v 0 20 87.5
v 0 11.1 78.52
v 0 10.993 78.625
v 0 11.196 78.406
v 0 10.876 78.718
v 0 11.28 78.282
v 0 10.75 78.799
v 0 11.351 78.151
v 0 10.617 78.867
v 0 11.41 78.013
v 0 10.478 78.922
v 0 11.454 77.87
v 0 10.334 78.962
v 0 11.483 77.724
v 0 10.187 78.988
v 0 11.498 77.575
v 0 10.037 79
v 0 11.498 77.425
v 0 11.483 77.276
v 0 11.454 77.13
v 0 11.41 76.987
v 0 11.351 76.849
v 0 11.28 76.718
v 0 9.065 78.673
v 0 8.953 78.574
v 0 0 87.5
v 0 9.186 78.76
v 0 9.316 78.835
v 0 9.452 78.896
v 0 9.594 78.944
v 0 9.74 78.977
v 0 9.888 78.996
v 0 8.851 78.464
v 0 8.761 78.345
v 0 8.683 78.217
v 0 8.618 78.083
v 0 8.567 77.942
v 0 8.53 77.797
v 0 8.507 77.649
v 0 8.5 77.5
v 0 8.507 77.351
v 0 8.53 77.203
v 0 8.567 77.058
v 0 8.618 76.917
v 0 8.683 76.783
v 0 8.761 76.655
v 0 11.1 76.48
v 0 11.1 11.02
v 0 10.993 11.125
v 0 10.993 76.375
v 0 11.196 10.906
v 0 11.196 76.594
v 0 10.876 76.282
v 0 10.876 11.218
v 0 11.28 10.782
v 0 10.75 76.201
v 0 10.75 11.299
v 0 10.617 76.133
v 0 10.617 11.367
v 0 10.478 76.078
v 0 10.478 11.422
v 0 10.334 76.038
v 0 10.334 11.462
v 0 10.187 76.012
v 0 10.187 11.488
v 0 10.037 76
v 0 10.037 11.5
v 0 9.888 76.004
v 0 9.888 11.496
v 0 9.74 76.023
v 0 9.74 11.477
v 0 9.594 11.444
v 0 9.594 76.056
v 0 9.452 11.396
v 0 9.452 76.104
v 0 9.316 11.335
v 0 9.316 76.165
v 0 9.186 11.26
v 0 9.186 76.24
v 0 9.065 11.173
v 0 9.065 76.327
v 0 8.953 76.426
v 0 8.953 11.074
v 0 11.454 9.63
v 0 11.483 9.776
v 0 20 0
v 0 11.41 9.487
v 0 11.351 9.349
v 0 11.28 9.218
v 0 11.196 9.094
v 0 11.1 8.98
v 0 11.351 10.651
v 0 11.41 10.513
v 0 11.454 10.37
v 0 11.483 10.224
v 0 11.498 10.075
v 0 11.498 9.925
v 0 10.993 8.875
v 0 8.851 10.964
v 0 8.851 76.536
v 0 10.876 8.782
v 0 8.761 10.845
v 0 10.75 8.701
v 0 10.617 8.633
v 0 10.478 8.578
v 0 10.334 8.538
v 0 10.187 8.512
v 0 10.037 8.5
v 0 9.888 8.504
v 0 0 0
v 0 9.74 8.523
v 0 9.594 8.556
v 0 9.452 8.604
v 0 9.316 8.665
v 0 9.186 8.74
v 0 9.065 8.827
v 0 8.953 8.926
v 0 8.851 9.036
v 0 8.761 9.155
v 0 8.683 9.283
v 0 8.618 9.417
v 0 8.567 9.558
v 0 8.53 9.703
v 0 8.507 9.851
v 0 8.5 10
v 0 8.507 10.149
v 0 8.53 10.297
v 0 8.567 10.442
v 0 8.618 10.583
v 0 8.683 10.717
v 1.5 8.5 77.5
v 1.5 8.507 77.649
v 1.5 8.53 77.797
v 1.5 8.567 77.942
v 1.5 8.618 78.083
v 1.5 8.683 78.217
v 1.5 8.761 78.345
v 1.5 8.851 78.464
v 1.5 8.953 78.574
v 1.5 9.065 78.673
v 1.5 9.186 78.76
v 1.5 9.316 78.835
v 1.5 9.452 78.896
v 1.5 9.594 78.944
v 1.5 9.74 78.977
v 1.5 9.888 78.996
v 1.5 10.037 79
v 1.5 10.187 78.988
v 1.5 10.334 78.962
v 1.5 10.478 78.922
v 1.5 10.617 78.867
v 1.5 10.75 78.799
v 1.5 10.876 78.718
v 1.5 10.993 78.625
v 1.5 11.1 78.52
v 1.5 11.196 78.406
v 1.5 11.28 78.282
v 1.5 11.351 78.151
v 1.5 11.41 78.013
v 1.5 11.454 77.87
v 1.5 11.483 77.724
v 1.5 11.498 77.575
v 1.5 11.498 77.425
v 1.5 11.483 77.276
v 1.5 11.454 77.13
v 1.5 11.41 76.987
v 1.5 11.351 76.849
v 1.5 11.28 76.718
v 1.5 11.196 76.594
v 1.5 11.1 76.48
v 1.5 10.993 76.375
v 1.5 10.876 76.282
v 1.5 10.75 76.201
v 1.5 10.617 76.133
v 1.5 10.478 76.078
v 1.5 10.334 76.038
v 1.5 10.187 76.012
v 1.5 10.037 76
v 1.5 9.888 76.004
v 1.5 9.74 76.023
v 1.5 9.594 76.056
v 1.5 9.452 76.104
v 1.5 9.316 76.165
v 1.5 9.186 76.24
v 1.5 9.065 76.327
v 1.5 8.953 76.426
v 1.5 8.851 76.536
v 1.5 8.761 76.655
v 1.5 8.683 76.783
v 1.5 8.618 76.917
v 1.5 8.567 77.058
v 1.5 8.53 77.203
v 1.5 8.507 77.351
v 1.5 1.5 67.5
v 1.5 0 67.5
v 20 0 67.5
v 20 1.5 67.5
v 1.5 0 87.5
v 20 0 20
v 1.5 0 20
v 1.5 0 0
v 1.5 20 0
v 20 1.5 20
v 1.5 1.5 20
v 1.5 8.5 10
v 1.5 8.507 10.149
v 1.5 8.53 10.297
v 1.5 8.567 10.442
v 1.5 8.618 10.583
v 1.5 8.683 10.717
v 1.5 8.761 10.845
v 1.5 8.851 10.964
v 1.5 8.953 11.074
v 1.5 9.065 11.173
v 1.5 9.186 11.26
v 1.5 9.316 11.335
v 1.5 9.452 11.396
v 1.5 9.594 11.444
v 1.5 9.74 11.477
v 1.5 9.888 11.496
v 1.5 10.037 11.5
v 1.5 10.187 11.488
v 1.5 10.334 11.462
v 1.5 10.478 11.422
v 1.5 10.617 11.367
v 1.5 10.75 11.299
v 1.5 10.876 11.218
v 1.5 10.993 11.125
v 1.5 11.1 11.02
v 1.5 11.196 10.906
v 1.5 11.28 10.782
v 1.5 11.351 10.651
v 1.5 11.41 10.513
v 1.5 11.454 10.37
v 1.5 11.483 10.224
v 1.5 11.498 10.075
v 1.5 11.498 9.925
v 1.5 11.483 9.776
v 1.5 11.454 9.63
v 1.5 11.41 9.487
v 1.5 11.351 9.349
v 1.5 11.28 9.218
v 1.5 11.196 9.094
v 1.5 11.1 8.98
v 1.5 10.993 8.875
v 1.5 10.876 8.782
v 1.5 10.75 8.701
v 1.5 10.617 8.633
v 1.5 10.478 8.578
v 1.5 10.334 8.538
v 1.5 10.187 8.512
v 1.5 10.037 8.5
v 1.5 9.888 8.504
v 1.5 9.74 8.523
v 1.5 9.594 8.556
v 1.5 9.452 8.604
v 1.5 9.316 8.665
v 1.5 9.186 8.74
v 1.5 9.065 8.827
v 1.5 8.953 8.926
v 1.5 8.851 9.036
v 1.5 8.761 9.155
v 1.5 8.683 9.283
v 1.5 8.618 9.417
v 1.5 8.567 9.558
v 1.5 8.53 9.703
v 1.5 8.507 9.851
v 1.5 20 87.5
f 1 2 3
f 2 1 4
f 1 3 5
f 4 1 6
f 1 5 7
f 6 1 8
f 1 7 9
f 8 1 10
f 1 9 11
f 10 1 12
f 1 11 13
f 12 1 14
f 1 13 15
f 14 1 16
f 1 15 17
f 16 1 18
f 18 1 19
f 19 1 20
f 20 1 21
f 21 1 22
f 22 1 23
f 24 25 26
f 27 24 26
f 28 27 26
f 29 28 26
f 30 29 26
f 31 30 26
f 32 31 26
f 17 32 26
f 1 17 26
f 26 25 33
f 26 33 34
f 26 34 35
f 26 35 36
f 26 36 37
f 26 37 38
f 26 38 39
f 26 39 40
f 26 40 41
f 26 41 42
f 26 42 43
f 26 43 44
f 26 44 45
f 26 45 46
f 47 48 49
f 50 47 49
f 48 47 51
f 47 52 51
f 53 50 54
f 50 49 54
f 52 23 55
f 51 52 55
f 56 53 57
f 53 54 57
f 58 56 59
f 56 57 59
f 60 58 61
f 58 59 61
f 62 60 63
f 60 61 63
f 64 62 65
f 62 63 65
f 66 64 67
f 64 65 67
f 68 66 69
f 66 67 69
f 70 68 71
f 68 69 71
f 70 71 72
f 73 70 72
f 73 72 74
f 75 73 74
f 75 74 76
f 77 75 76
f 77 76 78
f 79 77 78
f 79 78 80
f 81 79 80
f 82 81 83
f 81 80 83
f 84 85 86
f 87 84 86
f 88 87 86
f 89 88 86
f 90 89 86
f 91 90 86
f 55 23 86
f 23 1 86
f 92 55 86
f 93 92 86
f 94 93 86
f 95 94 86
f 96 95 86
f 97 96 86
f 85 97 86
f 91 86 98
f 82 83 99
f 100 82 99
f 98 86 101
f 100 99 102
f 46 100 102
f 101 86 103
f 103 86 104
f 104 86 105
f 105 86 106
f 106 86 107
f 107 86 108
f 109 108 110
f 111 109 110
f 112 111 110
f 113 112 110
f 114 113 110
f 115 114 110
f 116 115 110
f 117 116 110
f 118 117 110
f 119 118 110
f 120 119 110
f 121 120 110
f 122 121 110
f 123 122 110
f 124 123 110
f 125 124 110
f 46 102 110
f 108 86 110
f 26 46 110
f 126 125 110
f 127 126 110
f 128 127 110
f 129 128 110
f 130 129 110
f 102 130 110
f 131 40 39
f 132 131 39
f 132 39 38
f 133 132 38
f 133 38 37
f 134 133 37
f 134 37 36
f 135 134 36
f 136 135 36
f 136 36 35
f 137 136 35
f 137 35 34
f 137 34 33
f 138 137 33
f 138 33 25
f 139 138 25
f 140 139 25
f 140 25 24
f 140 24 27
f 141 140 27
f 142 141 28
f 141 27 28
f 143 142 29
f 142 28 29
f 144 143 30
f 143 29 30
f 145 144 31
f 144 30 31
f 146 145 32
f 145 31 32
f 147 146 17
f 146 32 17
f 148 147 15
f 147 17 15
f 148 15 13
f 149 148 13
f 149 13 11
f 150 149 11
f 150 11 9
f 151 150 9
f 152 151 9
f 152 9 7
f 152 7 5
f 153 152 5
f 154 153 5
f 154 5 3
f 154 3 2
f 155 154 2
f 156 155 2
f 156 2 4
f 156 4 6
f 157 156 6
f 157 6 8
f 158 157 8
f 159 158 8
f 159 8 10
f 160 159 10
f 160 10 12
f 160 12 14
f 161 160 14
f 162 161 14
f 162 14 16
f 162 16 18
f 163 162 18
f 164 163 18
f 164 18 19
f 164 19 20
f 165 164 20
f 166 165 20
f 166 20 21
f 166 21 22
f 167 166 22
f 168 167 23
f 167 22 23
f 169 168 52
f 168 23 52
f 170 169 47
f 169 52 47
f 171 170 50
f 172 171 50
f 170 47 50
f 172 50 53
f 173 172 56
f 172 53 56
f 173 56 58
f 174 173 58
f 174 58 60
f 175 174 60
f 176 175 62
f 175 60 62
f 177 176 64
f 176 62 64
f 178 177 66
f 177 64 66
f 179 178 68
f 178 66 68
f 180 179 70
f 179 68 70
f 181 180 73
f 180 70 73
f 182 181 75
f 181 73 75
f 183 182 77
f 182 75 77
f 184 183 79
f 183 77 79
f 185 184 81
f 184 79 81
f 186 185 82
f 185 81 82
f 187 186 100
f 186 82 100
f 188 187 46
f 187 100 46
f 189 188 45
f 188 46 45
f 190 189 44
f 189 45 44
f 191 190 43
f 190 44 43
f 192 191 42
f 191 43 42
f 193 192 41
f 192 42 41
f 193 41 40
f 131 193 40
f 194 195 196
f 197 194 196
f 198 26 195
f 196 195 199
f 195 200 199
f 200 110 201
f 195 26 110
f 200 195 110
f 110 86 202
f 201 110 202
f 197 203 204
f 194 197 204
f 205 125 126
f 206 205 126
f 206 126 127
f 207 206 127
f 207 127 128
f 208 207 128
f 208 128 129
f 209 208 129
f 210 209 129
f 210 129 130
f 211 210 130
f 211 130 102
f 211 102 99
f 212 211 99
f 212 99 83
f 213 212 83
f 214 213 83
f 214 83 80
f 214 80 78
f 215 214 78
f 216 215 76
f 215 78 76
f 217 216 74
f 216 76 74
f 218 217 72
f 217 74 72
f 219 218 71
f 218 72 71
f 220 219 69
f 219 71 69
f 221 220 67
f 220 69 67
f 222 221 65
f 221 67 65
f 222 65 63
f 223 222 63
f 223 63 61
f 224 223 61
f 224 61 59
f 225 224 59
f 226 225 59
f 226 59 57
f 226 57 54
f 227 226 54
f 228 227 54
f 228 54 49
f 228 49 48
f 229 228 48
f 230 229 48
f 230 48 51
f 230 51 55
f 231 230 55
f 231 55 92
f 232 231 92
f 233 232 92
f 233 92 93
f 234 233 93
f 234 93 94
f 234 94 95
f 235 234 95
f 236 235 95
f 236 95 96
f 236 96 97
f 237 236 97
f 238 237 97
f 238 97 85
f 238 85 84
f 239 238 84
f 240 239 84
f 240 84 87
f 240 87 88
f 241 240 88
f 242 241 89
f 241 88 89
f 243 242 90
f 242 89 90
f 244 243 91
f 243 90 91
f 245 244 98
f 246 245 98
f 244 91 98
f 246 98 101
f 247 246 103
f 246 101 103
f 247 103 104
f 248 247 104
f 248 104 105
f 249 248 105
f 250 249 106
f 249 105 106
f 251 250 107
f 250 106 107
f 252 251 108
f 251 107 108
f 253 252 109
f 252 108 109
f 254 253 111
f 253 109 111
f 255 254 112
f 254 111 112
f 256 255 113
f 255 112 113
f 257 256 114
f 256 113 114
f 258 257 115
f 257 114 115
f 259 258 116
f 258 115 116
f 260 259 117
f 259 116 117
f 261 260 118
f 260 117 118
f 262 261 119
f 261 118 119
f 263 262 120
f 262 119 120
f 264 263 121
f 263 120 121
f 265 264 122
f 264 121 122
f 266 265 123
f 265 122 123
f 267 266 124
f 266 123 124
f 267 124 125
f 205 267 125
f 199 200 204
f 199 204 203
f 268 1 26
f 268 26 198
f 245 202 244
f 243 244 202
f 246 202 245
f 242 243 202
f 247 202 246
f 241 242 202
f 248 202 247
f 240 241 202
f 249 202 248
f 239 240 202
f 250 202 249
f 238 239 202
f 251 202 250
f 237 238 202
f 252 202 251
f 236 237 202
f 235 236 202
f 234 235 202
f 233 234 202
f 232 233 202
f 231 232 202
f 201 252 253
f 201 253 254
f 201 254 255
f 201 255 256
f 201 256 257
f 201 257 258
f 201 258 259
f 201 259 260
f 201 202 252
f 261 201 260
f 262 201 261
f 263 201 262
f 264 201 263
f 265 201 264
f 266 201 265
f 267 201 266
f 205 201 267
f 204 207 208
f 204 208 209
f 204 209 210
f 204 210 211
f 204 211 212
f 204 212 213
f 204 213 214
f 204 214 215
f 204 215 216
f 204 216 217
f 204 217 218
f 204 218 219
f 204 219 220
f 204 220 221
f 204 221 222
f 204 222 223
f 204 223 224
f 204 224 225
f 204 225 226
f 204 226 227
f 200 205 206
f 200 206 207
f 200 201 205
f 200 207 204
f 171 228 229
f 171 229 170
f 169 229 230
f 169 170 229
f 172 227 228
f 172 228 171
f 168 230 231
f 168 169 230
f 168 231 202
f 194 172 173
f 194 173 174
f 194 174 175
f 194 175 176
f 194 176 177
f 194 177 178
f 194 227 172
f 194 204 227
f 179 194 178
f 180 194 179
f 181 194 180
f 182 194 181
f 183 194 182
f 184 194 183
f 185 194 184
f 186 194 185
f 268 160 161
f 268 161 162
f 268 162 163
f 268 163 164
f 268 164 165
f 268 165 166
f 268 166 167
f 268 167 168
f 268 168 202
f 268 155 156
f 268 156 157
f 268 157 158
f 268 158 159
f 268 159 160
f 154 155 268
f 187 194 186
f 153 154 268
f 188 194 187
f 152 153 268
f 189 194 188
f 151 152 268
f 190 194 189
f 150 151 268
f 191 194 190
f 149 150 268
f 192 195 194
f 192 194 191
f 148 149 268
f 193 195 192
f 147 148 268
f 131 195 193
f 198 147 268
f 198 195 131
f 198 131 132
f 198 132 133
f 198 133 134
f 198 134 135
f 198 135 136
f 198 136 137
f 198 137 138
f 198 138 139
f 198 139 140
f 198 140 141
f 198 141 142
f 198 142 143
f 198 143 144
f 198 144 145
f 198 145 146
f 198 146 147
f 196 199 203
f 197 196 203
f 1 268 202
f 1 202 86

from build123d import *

# Parameters (mm, degrees)
EXTRUSION1_DEPTH = 87.5
ESQUISSE3_R      = 1.5
EXTRUSION3_DEPTH = 10
ESQUISSE4_W      = 18.5
ESQUISSE4_H      = 20
EXTRUSION4_DEPTH = 1.5


with BuildPart() as part:
    # Esquisse1 → Extrusion1 (new body)
    with BuildSketch(Plane.XY):
        Polygon((0, 0), (20, 0), (20, 1.5), (1.5, 1.5), (1.5, 20), (0, 20), align=None)
    extrude(amount=EXTRUSION1_DEPTH)

    # Esquisse3 → Extrusion3 (cut)
    with BuildSketch(Plane.ZY):
        with Locations(Location((77.5, 10, 0), (0, 0, 270))):
            Circle(ESQUISSE3_R)
        with Locations(Location((10, 10, 0), (0, 0, 270))):
            Circle(ESQUISSE3_R)
    extrude(amount=-EXTRUSION3_DEPTH, mode=Mode.SUBTRACT)

    # Esquisse4 → Extrusion4 (cut)
    with BuildSketch(Plane.XZ):
        with Locations((10.75, 10)):
            Rectangle(ESQUISSE4_W, ESQUISSE4_H)
        with Locations((10.75, 77.5)):
            Rectangle(ESQUISSE4_W, ESQUISSE4_H)
    extrude(amount=-EXTRUSION4_DEPTH, mode=Mode.SUBTRACT)


solid = part.part
